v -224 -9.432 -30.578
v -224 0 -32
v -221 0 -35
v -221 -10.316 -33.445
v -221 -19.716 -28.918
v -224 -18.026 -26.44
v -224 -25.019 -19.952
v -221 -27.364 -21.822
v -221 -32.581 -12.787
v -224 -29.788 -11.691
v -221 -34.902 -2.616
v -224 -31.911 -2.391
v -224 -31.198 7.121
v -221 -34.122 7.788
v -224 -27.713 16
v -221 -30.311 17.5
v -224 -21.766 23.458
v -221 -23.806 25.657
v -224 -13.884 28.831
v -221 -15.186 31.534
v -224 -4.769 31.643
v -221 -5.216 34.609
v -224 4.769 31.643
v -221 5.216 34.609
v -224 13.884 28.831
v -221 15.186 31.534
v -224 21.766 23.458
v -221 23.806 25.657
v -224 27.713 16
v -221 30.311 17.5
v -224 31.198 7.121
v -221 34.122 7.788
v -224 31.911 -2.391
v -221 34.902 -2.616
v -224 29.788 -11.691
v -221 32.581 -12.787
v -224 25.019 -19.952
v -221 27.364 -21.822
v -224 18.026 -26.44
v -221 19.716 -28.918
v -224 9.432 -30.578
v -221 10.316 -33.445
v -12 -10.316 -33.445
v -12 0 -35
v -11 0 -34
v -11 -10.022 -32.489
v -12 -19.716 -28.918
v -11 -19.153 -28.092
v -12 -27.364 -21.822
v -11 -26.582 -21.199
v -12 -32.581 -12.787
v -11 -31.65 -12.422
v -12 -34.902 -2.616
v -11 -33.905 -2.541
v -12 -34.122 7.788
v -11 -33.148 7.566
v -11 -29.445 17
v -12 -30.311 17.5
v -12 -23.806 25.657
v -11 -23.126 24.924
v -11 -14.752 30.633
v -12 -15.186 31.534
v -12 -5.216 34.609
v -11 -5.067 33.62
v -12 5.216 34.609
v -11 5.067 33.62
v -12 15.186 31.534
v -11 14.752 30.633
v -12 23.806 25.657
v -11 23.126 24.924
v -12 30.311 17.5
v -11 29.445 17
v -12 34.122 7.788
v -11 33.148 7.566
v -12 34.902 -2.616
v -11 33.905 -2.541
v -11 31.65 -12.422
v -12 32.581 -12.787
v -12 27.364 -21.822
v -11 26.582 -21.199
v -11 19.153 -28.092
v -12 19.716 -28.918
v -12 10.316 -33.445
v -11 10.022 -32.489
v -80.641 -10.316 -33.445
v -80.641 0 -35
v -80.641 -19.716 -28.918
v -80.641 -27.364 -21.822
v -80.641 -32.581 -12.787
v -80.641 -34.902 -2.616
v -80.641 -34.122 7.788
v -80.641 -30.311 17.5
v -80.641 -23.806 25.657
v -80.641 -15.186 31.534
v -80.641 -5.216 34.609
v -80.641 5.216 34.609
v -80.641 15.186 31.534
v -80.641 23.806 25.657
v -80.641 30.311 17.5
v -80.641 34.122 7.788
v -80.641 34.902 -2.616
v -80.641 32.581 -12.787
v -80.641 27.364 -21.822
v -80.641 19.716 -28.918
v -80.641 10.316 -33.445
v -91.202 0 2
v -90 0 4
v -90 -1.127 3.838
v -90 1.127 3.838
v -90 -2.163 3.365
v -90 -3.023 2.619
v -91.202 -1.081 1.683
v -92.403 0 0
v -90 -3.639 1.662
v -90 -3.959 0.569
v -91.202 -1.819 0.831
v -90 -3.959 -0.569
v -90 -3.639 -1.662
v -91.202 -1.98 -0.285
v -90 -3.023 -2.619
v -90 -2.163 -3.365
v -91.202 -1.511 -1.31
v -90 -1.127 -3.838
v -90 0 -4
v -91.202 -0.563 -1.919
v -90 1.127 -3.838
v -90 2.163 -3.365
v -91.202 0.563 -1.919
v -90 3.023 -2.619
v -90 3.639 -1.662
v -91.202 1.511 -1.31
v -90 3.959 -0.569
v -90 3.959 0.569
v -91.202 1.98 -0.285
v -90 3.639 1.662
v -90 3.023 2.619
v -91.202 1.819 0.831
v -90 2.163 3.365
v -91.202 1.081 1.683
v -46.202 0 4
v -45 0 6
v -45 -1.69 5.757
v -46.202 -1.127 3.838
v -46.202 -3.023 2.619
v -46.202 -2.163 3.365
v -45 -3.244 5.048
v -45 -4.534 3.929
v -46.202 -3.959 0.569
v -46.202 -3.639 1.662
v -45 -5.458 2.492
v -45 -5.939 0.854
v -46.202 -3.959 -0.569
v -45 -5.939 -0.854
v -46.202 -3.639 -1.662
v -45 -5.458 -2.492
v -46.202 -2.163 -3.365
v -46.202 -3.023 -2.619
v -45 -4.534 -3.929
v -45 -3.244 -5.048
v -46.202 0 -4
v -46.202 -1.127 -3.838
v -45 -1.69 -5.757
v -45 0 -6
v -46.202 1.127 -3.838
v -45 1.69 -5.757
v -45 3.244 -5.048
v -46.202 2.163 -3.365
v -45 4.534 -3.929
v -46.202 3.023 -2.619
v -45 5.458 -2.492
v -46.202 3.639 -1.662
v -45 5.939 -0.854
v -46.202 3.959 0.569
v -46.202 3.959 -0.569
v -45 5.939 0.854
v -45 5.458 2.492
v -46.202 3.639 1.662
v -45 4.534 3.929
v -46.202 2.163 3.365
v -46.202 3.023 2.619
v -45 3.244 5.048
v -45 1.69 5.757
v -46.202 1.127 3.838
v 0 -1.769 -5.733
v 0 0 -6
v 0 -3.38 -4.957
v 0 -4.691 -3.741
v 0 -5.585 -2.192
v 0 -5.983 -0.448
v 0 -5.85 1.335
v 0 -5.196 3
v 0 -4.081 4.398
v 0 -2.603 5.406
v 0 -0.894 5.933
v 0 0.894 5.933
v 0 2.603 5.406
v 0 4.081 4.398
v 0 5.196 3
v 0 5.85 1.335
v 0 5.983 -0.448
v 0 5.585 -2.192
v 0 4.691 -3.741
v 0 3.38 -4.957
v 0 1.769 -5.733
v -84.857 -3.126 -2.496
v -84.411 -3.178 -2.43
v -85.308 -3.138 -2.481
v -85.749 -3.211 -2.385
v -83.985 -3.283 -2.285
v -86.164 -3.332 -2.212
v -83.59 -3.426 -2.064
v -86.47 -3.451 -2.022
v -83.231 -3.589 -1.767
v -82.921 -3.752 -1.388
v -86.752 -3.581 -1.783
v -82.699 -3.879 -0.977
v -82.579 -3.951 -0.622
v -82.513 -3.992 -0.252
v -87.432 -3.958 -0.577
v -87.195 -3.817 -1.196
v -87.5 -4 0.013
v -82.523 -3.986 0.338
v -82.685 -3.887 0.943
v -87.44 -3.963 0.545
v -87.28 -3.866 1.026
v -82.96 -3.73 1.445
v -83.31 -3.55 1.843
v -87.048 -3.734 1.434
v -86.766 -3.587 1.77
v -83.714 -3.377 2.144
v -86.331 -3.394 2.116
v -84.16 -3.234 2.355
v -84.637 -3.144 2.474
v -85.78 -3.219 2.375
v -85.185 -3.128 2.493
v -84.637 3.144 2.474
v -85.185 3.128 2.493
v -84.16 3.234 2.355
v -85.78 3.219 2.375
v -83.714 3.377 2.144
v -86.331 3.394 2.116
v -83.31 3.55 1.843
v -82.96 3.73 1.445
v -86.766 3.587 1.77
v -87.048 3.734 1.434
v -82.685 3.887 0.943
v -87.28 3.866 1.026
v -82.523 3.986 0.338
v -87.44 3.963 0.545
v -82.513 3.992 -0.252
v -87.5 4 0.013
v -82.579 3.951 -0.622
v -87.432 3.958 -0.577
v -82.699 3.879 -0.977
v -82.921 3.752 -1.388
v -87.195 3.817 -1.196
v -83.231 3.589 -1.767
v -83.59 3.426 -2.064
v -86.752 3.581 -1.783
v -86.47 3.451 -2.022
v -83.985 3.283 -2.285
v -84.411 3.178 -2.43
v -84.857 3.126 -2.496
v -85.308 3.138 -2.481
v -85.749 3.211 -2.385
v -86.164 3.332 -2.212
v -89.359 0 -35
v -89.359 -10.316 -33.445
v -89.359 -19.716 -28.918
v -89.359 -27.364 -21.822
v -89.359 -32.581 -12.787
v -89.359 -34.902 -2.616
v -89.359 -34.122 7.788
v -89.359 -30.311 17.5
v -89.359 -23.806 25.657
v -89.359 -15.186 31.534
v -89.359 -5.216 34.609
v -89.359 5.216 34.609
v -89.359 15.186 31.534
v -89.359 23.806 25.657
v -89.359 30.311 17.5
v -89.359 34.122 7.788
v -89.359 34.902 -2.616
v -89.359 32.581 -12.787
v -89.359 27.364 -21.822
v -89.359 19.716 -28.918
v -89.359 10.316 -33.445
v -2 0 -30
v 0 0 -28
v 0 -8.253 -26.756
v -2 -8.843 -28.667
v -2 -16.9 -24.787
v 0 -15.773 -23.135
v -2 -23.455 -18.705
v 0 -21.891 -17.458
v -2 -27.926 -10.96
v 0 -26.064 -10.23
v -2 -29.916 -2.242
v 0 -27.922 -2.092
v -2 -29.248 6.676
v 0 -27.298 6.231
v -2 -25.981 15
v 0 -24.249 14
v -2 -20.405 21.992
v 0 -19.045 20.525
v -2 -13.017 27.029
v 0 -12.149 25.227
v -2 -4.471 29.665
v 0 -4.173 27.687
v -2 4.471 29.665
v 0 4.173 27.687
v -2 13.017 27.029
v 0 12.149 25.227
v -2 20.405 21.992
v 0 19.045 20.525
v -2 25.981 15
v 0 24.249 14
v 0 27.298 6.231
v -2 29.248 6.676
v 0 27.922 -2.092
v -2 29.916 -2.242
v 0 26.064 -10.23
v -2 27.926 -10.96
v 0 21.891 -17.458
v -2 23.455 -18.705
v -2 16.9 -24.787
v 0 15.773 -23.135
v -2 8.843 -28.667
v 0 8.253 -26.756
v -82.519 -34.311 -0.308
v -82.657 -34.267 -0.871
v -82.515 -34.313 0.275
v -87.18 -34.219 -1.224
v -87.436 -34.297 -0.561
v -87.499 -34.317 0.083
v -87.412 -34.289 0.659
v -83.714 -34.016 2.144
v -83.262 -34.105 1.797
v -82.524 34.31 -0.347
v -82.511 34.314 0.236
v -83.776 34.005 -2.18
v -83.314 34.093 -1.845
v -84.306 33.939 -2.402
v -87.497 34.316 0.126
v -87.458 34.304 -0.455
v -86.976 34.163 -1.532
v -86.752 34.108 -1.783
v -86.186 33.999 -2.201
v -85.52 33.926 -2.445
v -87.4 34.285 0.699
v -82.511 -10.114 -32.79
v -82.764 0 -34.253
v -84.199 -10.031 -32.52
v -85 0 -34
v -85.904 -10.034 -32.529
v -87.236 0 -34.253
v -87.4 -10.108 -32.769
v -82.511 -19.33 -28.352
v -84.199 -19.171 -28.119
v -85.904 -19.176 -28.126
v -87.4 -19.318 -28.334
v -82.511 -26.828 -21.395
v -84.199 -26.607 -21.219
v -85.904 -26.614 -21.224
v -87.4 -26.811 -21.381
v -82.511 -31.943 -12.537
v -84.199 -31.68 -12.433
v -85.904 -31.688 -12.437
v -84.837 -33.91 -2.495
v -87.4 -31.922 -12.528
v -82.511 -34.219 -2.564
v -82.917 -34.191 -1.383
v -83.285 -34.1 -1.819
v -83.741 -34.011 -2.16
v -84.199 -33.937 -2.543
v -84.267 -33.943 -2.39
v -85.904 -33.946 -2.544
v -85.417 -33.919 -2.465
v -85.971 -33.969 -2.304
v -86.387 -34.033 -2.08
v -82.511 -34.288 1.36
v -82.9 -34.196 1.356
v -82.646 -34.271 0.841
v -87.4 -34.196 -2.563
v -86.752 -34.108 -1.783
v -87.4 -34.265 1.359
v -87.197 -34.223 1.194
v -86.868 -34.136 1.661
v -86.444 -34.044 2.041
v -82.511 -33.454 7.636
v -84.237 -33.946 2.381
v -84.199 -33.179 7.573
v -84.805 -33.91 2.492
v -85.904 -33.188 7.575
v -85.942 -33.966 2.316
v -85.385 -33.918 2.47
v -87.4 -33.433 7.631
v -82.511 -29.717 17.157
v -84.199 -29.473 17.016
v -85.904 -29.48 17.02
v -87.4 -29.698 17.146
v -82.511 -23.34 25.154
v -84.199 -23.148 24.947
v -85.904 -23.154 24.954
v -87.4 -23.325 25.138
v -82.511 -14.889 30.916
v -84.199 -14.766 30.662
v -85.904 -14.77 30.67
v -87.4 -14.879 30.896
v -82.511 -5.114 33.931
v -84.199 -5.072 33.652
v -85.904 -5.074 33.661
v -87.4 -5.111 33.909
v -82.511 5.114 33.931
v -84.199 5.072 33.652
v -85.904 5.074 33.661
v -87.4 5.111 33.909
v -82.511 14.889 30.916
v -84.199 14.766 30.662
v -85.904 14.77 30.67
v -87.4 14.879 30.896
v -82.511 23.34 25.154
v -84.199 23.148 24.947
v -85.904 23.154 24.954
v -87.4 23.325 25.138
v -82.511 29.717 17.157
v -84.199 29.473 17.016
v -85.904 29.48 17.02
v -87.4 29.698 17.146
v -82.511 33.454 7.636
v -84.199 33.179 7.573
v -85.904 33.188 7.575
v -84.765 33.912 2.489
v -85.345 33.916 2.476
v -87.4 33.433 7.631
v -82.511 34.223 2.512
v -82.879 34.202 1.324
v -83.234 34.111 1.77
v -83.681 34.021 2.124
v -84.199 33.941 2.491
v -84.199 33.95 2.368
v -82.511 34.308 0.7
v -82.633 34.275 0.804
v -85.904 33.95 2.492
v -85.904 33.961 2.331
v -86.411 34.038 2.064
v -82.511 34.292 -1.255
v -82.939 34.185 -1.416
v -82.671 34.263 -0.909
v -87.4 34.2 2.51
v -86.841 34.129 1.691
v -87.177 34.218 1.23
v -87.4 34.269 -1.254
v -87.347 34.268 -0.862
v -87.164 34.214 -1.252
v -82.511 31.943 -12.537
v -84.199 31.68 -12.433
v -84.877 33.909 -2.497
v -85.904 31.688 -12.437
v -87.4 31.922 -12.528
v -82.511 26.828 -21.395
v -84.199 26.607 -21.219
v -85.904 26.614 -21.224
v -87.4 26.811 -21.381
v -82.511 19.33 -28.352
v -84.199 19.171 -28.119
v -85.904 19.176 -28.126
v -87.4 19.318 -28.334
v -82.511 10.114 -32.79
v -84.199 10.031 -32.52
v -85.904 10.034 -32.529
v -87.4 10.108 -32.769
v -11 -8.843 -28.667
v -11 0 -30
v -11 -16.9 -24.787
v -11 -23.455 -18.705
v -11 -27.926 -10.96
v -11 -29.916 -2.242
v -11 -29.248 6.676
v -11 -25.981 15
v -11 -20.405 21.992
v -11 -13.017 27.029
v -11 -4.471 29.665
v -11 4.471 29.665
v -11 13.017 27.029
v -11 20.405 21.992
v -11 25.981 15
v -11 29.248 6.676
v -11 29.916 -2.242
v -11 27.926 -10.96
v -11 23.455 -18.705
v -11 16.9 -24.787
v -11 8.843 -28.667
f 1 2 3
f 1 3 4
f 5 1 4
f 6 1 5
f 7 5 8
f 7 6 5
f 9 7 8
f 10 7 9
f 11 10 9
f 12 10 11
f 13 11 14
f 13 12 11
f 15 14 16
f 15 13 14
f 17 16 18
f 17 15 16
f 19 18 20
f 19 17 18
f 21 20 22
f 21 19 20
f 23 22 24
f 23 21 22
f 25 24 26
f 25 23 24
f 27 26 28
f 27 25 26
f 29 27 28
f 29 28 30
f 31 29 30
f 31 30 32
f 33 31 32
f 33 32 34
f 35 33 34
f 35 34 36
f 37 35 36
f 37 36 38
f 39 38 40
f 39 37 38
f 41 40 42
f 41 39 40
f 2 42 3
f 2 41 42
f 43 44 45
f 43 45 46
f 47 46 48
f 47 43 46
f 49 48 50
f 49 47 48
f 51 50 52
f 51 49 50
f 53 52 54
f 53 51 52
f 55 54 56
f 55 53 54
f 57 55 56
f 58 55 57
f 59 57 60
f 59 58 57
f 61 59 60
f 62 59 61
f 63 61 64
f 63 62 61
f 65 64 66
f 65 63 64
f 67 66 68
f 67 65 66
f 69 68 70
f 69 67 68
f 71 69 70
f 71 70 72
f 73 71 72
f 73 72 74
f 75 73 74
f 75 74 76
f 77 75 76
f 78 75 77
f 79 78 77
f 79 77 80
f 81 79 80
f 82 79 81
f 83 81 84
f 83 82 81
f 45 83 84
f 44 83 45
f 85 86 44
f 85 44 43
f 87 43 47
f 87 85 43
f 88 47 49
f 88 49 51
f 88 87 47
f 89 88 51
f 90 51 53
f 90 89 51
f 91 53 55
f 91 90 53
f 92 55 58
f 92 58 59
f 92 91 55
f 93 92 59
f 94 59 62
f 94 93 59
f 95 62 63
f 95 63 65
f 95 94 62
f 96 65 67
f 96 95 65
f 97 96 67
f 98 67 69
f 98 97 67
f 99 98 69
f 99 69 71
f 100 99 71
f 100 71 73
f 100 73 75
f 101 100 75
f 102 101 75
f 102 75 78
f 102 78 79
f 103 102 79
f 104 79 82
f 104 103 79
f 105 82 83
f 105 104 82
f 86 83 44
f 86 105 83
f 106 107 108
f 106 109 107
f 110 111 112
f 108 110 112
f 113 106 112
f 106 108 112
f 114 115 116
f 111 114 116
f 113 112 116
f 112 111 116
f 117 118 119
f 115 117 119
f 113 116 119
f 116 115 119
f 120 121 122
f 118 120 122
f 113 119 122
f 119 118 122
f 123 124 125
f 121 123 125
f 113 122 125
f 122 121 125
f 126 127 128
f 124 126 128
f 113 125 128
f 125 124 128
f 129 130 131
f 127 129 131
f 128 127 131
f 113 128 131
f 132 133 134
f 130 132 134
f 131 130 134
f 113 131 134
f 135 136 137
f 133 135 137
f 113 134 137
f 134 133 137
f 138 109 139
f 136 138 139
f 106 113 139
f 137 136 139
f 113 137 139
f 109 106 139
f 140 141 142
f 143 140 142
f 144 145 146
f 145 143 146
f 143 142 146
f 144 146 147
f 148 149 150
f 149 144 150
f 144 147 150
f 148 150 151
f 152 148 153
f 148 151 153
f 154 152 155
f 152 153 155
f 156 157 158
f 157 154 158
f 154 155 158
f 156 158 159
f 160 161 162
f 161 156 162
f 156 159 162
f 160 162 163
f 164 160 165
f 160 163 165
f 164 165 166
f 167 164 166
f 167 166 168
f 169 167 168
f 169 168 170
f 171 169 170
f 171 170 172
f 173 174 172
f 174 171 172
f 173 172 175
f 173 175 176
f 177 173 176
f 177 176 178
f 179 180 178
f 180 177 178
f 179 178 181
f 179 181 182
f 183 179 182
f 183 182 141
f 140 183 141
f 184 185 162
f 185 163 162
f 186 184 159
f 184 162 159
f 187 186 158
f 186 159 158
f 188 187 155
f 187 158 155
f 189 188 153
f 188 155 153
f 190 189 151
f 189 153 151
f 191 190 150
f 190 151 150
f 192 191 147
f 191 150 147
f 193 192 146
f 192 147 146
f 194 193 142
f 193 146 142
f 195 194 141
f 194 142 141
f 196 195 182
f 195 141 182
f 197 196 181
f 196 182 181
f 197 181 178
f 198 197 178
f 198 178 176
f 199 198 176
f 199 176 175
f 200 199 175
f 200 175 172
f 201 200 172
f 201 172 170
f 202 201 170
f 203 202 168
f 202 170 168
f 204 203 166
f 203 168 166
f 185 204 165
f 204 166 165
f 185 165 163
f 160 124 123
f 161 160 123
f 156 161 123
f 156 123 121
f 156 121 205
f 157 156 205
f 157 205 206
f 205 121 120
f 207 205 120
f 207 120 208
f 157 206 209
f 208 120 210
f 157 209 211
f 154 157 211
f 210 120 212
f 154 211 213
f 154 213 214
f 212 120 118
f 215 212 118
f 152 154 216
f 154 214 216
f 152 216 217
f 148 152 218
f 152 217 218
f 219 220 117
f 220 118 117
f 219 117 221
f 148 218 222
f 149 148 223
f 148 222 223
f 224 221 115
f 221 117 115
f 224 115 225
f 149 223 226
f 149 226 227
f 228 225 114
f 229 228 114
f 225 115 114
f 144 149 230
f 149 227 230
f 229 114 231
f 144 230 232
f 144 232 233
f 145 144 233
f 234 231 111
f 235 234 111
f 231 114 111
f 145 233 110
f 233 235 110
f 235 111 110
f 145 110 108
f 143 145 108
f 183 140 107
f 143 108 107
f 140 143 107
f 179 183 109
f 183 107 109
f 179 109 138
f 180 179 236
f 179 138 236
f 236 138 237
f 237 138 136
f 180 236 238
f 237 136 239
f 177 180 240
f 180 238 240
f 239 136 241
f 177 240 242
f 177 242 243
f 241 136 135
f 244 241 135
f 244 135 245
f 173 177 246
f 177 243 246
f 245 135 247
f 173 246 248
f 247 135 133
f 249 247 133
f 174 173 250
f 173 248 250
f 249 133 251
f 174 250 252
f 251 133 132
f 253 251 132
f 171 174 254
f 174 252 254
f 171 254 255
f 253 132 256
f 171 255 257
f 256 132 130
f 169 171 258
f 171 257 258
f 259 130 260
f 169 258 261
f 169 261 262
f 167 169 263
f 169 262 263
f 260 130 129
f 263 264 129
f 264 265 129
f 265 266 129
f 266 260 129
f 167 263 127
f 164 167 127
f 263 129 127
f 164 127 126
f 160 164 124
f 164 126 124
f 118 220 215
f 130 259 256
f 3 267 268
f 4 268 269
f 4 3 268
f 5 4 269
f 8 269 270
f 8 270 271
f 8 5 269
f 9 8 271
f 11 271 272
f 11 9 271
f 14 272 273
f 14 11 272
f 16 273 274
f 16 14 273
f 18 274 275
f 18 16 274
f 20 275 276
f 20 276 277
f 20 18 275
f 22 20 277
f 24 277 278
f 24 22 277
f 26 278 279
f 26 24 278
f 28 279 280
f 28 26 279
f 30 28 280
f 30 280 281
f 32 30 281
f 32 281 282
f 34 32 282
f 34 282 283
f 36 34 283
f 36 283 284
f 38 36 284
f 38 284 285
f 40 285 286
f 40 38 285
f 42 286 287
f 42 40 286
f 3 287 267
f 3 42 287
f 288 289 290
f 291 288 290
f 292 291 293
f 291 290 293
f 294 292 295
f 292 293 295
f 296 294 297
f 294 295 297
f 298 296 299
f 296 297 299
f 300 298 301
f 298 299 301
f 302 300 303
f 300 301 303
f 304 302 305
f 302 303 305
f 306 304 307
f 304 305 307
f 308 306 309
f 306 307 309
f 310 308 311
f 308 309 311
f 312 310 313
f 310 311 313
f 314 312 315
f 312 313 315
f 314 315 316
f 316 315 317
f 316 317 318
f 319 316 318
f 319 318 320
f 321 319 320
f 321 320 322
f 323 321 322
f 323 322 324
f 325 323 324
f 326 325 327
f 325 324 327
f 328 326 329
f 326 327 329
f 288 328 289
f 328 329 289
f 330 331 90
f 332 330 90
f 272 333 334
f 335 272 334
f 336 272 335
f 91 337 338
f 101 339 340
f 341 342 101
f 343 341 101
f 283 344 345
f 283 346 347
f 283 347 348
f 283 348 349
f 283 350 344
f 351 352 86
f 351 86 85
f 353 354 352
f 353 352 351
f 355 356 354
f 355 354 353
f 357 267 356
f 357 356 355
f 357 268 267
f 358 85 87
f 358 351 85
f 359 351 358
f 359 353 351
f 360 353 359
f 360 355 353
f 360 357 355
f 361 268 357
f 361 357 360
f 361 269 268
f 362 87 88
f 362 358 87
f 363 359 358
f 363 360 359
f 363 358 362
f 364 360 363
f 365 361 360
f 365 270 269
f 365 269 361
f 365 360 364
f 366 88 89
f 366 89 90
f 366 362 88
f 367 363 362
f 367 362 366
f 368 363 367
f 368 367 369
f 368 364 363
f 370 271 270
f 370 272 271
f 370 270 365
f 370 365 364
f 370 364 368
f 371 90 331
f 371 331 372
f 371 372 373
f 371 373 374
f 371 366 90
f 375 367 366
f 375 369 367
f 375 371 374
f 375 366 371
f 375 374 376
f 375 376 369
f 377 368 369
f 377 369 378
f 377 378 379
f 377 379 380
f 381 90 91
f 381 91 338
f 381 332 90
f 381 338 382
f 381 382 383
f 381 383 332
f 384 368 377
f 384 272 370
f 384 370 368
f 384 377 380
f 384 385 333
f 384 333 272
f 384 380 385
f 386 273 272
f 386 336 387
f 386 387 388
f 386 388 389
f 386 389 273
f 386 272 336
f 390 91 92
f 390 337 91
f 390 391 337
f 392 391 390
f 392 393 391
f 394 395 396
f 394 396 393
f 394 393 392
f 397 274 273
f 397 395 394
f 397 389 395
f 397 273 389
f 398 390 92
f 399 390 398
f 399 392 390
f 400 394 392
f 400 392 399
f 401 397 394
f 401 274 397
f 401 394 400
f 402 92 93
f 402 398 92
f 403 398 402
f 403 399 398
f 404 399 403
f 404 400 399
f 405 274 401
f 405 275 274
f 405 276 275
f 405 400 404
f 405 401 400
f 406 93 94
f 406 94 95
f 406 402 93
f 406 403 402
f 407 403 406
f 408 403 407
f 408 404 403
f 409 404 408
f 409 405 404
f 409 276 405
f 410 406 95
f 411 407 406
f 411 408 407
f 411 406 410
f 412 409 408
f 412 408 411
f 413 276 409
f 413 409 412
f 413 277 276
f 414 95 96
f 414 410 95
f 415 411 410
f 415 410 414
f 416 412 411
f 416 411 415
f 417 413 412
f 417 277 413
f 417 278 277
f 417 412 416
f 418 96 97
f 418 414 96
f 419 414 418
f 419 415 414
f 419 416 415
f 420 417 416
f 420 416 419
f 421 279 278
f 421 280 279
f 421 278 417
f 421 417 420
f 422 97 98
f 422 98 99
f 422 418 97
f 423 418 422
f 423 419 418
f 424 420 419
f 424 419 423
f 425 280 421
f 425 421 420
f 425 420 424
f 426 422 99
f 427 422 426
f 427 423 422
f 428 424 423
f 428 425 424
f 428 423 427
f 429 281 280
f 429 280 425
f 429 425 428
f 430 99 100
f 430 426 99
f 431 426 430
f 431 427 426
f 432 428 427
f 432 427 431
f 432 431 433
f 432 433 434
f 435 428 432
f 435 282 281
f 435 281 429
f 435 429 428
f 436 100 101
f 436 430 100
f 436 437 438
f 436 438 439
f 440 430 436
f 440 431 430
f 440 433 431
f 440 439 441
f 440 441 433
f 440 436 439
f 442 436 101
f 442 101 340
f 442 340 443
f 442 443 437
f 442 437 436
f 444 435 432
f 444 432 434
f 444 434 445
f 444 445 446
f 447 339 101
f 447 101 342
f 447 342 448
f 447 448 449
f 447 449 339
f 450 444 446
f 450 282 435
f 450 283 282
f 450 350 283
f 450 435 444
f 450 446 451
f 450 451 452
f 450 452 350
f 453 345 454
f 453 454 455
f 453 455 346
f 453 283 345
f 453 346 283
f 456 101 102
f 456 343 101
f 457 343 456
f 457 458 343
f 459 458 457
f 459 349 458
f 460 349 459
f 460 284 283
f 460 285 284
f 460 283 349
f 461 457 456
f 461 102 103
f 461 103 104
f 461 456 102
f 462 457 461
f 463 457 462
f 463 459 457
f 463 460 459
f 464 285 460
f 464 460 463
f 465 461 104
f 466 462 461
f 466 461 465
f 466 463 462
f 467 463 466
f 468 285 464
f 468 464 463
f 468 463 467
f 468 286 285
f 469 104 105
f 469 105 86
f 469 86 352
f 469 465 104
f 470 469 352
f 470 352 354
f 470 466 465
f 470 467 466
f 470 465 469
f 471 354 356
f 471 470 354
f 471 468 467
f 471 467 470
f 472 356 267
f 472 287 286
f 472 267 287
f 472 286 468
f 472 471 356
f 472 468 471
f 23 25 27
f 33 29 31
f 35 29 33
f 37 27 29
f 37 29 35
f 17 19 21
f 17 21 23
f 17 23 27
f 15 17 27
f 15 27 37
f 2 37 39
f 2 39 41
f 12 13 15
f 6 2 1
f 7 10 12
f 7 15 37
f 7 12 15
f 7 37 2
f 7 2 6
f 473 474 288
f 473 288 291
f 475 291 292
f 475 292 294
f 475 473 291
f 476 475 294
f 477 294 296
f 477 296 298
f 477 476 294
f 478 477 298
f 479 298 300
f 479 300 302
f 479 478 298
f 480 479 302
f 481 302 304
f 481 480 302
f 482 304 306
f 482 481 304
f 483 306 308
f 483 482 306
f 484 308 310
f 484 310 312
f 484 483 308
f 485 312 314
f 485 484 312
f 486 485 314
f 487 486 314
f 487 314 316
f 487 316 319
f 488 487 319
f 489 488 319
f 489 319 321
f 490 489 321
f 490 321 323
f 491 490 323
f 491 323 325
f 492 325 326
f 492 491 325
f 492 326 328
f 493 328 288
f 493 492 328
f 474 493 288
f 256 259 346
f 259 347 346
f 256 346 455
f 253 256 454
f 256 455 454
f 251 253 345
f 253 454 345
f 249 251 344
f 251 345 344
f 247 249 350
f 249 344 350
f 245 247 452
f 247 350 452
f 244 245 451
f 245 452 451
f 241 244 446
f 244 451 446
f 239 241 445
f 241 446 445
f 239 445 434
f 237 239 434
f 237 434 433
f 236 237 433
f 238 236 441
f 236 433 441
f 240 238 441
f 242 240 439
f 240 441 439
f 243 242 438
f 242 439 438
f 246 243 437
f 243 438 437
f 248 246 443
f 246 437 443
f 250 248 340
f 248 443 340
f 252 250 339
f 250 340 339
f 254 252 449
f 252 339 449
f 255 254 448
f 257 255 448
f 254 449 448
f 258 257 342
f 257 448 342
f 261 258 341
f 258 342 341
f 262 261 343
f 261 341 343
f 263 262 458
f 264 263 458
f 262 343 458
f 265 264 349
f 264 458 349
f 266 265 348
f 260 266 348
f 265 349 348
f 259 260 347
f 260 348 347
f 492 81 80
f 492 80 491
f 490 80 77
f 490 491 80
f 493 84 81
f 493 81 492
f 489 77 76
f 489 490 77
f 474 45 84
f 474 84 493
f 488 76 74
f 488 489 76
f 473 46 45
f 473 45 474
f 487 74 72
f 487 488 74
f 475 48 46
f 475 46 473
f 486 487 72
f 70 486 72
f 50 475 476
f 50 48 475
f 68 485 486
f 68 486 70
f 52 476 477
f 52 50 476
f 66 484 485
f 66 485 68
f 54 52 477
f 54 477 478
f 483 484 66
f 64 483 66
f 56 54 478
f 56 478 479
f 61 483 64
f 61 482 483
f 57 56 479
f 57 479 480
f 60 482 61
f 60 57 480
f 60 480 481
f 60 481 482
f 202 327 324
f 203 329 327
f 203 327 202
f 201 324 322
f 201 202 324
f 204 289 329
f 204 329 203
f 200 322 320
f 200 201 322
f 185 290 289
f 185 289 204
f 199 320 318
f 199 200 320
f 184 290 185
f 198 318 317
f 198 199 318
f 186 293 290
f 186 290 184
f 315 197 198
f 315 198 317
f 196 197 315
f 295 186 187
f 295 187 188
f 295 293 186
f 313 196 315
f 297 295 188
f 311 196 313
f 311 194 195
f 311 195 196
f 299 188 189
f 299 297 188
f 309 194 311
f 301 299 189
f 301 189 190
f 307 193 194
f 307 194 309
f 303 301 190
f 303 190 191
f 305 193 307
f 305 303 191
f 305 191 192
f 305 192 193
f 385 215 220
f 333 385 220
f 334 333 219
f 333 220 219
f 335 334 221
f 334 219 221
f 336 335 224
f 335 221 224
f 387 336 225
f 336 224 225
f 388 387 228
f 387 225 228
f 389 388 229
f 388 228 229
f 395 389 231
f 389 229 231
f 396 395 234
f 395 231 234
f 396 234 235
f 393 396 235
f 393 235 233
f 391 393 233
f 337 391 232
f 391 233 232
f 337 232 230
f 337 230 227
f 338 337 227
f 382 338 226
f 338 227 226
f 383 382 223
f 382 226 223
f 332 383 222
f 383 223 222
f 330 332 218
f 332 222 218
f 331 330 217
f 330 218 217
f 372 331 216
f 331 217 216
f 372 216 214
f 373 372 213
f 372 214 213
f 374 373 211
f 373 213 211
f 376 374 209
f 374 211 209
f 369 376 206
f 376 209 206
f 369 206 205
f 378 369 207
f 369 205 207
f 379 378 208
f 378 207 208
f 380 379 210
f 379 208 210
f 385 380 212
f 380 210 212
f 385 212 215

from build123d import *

# Parameters (mm, degrees)
CHAMFER_1_SIZE            = 3
CHAMFER_2_SIZE            = 2
CHAMFER_3_SIZE            = 1
SKETCH_2_R                = 2.5
CUT_EXTRUDE_1_DEPTH       = 50
HOLE_WIZARD_8_0_8_1_D     = 8
HOLE_WIZARD_8_0_8_1_DEPTH = 90
HOLE_WIZARD_8_0_8_1_TIP   = 2.403442476
HOLE_WIZARD_M14_1_D       = 12
HOLE_WIZARD_M14_1_DEPTH   = 45
HOLE_WIZARD_M14_1_TIP     = 3.605163714


with BuildPart() as part:
    # 草图1 → 旋转1 (revolve)
    with BuildSketch(Plane.XY, mode=Mode.PRIVATE) as revolve_1_sk:
        with BuildLine():
            Line((0, 0), (0, 30))
            Line((0, 30), (-11, 30))
            Line((-11, 30), (-11, 35))
            Line((-11, 35), (-80.641101056, 35))
            ThreePointArc((-80.641101056, 35), (-85, 34), (-89.358898944, 35))
            Line((-89.358898944, 35), (-224, 35))
            Line((-224, 35), (-224, 0))
            Line((-224, 0), (0, 0))
        make_face()
    revolve(revolve_1_sk.sketch.rotate(Axis((0, 0, 0), (-1, 0, 0)), 90), axis=Axis((0, 0, 0), (-1, 0, 0)))

    # 倒角1
    chamfer_1_edges = [part.edges().sort_by_distance(p)[0] for p in [
        (-224, 0, 35),
    ]]
    chamfer(chamfer_1_edges, length=CHAMFER_1_SIZE)

    # 倒角2
    chamfer_2_edges = [part.edges().sort_by_distance(p)[0] for p in [
        (0, 0, 30),
    ]]
    chamfer(chamfer_2_edges, length=CHAMFER_2_SIZE)

    # 倒角3
    chamfer_3_edges = [part.edges().sort_by_distance(p)[0] for p in [
        (-11, 0, 35),
    ]]
    chamfer(chamfer_3_edges, length=CHAMFER_3_SIZE)

    # 草图2 → 切除-拉伸1 (cut, symmetric)
    with BuildSketch(Plane(origin=(0, 0, 0), x_dir=(1, 0, 0), z_dir=(0, 1, 0))):
        with Locations(Location((-85, 0, 0), (0, 0, 134.50396252))):
            Circle(SKETCH_2_R)
    extrude(amount=CUT_EXTRUDE_1_DEPTH, both=True, mode=Mode.SUBTRACT)

    # Ø8.0 (8) 直径孔1
    with Locations(Plane(origin=(0, 0, 0), x_dir=(0, 0, 1), z_dir=(1, 0, 0))):
        with Locations((0, 0)):
            Hole(HOLE_WIZARD_8_0_8_1_D / 2, depth=HOLE_WIZARD_8_0_8_1_DEPTH)
            with Locations((0, 0, -(HOLE_WIZARD_8_0_8_1_DEPTH + HOLE_WIZARD_8_0_8_1_TIP / 2))):  # 118° drill point
                Cone(0, HOLE_WIZARD_8_0_8_1_D / 2, HOLE_WIZARD_8_0_8_1_TIP, mode=Mode.SUBTRACT)

    # M14 螺纹孔1
    with Locations(Plane(origin=(0, 0, 0), x_dir=(0, 0, 1), z_dir=(1, 0, 0))):
        with Locations((0, 0)):
            Hole(HOLE_WIZARD_M14_1_D / 2, depth=HOLE_WIZARD_M14_1_DEPTH)
            with Locations((0, 0, -(HOLE_WIZARD_M14_1_DEPTH + HOLE_WIZARD_M14_1_TIP / 2))):  # 118° drill point
                Cone(0, HOLE_WIZARD_M14_1_D / 2, HOLE_WIZARD_M14_1_TIP, mode=Mode.SUBTRACT)


solid = part.part
